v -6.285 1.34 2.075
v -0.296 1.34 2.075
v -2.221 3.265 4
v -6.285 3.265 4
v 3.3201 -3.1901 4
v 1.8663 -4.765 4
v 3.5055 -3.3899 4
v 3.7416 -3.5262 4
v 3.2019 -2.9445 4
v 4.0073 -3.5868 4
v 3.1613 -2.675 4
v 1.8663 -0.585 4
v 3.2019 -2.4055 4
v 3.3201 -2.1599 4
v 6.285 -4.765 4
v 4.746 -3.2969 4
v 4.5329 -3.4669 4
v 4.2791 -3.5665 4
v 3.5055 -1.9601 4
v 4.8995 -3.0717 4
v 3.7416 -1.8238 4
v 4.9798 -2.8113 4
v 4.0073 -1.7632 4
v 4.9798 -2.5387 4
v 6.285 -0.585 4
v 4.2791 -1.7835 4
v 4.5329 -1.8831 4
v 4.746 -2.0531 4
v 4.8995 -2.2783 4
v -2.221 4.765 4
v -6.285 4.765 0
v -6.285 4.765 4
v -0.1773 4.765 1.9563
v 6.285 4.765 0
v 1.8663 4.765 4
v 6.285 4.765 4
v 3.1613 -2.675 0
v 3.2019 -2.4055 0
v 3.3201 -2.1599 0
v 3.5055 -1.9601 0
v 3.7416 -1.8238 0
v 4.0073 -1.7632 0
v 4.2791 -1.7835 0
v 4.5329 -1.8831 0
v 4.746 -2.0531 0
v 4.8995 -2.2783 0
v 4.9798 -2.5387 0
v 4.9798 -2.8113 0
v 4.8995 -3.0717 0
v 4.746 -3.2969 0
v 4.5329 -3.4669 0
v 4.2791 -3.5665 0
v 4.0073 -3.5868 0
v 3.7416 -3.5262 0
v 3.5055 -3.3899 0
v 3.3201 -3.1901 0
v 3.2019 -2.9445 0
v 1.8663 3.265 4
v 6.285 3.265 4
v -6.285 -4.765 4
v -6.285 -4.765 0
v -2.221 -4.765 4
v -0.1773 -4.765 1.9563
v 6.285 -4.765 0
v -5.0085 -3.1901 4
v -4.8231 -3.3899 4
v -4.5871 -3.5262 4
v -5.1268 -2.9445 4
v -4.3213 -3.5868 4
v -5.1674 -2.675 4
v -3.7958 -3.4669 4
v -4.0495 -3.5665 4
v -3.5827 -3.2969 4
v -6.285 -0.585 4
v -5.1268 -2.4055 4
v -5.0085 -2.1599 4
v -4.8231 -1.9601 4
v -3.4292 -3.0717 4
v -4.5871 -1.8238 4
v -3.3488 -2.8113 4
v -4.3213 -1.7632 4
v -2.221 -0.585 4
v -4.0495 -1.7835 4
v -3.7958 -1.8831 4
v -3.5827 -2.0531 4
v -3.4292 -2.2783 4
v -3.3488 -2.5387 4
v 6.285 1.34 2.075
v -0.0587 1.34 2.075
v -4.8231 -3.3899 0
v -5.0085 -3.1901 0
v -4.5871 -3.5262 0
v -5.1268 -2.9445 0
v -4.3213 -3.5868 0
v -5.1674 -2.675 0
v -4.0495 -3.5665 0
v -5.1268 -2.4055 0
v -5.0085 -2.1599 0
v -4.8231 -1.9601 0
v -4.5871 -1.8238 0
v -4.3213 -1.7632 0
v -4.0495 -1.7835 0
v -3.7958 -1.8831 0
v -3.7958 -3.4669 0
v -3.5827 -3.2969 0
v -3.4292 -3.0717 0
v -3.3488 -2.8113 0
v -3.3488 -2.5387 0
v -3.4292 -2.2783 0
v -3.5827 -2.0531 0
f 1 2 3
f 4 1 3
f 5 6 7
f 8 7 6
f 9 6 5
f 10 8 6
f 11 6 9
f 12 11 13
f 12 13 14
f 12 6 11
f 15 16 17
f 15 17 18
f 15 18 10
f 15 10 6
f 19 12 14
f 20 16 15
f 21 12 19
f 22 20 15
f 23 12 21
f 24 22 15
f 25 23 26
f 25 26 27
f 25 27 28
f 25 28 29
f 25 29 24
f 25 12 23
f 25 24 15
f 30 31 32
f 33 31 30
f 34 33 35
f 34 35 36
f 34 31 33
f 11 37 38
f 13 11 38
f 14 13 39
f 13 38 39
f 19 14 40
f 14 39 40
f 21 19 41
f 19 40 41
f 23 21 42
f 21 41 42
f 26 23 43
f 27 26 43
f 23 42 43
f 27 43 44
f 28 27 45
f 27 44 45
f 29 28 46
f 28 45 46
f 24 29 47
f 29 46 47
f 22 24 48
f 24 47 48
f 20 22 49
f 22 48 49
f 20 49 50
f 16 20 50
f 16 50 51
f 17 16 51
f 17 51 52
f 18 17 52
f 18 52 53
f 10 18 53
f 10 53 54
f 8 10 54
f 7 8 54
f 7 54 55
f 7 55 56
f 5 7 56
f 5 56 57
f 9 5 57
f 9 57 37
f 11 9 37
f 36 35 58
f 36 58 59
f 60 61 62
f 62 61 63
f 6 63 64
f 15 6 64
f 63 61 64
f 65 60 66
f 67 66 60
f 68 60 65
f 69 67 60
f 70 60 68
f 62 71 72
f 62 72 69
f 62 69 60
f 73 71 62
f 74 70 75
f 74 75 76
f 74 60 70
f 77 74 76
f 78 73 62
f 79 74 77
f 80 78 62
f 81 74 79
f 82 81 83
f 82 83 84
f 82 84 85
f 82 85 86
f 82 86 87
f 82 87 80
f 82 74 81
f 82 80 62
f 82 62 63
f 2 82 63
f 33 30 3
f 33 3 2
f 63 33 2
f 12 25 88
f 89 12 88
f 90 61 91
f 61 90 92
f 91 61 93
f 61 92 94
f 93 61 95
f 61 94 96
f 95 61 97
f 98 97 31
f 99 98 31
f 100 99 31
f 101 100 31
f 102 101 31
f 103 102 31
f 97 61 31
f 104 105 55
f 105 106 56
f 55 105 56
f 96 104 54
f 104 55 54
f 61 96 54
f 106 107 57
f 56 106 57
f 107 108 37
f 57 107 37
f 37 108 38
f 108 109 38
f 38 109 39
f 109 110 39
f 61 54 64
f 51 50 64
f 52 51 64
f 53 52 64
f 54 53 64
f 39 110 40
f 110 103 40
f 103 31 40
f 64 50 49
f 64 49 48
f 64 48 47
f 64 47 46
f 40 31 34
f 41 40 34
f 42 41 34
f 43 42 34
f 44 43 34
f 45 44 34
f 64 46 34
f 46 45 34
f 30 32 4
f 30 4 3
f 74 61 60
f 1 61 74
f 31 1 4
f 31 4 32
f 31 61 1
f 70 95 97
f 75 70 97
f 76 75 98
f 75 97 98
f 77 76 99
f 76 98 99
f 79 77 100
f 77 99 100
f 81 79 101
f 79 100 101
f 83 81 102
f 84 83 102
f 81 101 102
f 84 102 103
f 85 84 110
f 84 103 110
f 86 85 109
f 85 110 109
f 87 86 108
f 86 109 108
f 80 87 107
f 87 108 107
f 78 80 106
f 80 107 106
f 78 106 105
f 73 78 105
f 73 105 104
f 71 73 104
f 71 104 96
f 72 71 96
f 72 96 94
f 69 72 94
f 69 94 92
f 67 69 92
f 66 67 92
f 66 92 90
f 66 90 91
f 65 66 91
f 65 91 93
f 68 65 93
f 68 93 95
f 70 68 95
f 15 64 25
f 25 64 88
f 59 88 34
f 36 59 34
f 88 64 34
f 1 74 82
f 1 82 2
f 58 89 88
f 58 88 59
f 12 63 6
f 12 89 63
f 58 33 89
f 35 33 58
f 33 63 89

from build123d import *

# Parameters (mm, degrees)
SKETCH1_W                 = 12.57
SKETCH1_H                 = 9.53
BOSS_EXTRUDE1_DEPTH       = 4
CUT_EXTRUDE1_REACH        = 14.57
CUT_EXTRUDE2_REACH        = 11.53
F_1_72_TAPPED_HOLE1_D     = 1.8288
F_1_72_TAPPED_HOLE1_DEPTH = 4


with BuildPart() as part:
    # Sketch1 → Boss-Extrude1 (new body)
    with BuildSketch(Plane.XY):
        Rectangle(SKETCH1_W, SKETCH1_H)
    extrude(amount=BOSS_EXTRUDE1_DEPTH)

    # Sketch2 → Cut-Extrude1 (cut, up to next)
    with BuildSketch(Plane.ZY.offset(6.285), mode=Mode.PRIVATE) as cut_extrude1_sk1:
        Polygon((4, 3.265), (4, -0.585), (2.075, 1.34), align=None)
    cut_extrude1_tool1 = extrude(cut_extrude1_sk1.sketch, amount=-CUT_EXTRUDE1_REACH, mode=Mode.PRIVATE) & part.part
    add(cut_extrude1_tool1.solids().sort_by_distance((-6.285, 1.34, 3.358333))[0], mode=Mode.SUBTRACT)

    # Sketch3 → Cut-Extrude2 (cut, up to next)
    with BuildSketch(Plane(origin=(0, 4.765, 0), x_dir=(1, 0, 0), z_dir=(0, 1, 0)), mode=Mode.PRIVATE) as cut_extrude2_sk1:
        Polygon((-2.221, -4), (-0.177343653, -1.956343653), (1.866312693, -4), align=None)
    cut_extrude2_tool1 = extrude(cut_extrude2_sk1.sketch, amount=-CUT_EXTRUDE2_REACH, mode=Mode.PRIVATE) & part.part
    add(cut_extrude2_tool1.solids().sort_by_distance((-0.177344, 4.765, 3.318781))[0], mode=Mode.SUBTRACT)

    # #1-72 Tapped Hole1
    with Locations(Plane.XY.offset(4)):
        with Locations((-4.253, -2.675), (4.075656347, -2.675)):
            Hole(F_1_72_TAPPED_HOLE1_D / 2, depth=F_1_72_TAPPED_HOLE1_DEPTH)


solid = part.part
